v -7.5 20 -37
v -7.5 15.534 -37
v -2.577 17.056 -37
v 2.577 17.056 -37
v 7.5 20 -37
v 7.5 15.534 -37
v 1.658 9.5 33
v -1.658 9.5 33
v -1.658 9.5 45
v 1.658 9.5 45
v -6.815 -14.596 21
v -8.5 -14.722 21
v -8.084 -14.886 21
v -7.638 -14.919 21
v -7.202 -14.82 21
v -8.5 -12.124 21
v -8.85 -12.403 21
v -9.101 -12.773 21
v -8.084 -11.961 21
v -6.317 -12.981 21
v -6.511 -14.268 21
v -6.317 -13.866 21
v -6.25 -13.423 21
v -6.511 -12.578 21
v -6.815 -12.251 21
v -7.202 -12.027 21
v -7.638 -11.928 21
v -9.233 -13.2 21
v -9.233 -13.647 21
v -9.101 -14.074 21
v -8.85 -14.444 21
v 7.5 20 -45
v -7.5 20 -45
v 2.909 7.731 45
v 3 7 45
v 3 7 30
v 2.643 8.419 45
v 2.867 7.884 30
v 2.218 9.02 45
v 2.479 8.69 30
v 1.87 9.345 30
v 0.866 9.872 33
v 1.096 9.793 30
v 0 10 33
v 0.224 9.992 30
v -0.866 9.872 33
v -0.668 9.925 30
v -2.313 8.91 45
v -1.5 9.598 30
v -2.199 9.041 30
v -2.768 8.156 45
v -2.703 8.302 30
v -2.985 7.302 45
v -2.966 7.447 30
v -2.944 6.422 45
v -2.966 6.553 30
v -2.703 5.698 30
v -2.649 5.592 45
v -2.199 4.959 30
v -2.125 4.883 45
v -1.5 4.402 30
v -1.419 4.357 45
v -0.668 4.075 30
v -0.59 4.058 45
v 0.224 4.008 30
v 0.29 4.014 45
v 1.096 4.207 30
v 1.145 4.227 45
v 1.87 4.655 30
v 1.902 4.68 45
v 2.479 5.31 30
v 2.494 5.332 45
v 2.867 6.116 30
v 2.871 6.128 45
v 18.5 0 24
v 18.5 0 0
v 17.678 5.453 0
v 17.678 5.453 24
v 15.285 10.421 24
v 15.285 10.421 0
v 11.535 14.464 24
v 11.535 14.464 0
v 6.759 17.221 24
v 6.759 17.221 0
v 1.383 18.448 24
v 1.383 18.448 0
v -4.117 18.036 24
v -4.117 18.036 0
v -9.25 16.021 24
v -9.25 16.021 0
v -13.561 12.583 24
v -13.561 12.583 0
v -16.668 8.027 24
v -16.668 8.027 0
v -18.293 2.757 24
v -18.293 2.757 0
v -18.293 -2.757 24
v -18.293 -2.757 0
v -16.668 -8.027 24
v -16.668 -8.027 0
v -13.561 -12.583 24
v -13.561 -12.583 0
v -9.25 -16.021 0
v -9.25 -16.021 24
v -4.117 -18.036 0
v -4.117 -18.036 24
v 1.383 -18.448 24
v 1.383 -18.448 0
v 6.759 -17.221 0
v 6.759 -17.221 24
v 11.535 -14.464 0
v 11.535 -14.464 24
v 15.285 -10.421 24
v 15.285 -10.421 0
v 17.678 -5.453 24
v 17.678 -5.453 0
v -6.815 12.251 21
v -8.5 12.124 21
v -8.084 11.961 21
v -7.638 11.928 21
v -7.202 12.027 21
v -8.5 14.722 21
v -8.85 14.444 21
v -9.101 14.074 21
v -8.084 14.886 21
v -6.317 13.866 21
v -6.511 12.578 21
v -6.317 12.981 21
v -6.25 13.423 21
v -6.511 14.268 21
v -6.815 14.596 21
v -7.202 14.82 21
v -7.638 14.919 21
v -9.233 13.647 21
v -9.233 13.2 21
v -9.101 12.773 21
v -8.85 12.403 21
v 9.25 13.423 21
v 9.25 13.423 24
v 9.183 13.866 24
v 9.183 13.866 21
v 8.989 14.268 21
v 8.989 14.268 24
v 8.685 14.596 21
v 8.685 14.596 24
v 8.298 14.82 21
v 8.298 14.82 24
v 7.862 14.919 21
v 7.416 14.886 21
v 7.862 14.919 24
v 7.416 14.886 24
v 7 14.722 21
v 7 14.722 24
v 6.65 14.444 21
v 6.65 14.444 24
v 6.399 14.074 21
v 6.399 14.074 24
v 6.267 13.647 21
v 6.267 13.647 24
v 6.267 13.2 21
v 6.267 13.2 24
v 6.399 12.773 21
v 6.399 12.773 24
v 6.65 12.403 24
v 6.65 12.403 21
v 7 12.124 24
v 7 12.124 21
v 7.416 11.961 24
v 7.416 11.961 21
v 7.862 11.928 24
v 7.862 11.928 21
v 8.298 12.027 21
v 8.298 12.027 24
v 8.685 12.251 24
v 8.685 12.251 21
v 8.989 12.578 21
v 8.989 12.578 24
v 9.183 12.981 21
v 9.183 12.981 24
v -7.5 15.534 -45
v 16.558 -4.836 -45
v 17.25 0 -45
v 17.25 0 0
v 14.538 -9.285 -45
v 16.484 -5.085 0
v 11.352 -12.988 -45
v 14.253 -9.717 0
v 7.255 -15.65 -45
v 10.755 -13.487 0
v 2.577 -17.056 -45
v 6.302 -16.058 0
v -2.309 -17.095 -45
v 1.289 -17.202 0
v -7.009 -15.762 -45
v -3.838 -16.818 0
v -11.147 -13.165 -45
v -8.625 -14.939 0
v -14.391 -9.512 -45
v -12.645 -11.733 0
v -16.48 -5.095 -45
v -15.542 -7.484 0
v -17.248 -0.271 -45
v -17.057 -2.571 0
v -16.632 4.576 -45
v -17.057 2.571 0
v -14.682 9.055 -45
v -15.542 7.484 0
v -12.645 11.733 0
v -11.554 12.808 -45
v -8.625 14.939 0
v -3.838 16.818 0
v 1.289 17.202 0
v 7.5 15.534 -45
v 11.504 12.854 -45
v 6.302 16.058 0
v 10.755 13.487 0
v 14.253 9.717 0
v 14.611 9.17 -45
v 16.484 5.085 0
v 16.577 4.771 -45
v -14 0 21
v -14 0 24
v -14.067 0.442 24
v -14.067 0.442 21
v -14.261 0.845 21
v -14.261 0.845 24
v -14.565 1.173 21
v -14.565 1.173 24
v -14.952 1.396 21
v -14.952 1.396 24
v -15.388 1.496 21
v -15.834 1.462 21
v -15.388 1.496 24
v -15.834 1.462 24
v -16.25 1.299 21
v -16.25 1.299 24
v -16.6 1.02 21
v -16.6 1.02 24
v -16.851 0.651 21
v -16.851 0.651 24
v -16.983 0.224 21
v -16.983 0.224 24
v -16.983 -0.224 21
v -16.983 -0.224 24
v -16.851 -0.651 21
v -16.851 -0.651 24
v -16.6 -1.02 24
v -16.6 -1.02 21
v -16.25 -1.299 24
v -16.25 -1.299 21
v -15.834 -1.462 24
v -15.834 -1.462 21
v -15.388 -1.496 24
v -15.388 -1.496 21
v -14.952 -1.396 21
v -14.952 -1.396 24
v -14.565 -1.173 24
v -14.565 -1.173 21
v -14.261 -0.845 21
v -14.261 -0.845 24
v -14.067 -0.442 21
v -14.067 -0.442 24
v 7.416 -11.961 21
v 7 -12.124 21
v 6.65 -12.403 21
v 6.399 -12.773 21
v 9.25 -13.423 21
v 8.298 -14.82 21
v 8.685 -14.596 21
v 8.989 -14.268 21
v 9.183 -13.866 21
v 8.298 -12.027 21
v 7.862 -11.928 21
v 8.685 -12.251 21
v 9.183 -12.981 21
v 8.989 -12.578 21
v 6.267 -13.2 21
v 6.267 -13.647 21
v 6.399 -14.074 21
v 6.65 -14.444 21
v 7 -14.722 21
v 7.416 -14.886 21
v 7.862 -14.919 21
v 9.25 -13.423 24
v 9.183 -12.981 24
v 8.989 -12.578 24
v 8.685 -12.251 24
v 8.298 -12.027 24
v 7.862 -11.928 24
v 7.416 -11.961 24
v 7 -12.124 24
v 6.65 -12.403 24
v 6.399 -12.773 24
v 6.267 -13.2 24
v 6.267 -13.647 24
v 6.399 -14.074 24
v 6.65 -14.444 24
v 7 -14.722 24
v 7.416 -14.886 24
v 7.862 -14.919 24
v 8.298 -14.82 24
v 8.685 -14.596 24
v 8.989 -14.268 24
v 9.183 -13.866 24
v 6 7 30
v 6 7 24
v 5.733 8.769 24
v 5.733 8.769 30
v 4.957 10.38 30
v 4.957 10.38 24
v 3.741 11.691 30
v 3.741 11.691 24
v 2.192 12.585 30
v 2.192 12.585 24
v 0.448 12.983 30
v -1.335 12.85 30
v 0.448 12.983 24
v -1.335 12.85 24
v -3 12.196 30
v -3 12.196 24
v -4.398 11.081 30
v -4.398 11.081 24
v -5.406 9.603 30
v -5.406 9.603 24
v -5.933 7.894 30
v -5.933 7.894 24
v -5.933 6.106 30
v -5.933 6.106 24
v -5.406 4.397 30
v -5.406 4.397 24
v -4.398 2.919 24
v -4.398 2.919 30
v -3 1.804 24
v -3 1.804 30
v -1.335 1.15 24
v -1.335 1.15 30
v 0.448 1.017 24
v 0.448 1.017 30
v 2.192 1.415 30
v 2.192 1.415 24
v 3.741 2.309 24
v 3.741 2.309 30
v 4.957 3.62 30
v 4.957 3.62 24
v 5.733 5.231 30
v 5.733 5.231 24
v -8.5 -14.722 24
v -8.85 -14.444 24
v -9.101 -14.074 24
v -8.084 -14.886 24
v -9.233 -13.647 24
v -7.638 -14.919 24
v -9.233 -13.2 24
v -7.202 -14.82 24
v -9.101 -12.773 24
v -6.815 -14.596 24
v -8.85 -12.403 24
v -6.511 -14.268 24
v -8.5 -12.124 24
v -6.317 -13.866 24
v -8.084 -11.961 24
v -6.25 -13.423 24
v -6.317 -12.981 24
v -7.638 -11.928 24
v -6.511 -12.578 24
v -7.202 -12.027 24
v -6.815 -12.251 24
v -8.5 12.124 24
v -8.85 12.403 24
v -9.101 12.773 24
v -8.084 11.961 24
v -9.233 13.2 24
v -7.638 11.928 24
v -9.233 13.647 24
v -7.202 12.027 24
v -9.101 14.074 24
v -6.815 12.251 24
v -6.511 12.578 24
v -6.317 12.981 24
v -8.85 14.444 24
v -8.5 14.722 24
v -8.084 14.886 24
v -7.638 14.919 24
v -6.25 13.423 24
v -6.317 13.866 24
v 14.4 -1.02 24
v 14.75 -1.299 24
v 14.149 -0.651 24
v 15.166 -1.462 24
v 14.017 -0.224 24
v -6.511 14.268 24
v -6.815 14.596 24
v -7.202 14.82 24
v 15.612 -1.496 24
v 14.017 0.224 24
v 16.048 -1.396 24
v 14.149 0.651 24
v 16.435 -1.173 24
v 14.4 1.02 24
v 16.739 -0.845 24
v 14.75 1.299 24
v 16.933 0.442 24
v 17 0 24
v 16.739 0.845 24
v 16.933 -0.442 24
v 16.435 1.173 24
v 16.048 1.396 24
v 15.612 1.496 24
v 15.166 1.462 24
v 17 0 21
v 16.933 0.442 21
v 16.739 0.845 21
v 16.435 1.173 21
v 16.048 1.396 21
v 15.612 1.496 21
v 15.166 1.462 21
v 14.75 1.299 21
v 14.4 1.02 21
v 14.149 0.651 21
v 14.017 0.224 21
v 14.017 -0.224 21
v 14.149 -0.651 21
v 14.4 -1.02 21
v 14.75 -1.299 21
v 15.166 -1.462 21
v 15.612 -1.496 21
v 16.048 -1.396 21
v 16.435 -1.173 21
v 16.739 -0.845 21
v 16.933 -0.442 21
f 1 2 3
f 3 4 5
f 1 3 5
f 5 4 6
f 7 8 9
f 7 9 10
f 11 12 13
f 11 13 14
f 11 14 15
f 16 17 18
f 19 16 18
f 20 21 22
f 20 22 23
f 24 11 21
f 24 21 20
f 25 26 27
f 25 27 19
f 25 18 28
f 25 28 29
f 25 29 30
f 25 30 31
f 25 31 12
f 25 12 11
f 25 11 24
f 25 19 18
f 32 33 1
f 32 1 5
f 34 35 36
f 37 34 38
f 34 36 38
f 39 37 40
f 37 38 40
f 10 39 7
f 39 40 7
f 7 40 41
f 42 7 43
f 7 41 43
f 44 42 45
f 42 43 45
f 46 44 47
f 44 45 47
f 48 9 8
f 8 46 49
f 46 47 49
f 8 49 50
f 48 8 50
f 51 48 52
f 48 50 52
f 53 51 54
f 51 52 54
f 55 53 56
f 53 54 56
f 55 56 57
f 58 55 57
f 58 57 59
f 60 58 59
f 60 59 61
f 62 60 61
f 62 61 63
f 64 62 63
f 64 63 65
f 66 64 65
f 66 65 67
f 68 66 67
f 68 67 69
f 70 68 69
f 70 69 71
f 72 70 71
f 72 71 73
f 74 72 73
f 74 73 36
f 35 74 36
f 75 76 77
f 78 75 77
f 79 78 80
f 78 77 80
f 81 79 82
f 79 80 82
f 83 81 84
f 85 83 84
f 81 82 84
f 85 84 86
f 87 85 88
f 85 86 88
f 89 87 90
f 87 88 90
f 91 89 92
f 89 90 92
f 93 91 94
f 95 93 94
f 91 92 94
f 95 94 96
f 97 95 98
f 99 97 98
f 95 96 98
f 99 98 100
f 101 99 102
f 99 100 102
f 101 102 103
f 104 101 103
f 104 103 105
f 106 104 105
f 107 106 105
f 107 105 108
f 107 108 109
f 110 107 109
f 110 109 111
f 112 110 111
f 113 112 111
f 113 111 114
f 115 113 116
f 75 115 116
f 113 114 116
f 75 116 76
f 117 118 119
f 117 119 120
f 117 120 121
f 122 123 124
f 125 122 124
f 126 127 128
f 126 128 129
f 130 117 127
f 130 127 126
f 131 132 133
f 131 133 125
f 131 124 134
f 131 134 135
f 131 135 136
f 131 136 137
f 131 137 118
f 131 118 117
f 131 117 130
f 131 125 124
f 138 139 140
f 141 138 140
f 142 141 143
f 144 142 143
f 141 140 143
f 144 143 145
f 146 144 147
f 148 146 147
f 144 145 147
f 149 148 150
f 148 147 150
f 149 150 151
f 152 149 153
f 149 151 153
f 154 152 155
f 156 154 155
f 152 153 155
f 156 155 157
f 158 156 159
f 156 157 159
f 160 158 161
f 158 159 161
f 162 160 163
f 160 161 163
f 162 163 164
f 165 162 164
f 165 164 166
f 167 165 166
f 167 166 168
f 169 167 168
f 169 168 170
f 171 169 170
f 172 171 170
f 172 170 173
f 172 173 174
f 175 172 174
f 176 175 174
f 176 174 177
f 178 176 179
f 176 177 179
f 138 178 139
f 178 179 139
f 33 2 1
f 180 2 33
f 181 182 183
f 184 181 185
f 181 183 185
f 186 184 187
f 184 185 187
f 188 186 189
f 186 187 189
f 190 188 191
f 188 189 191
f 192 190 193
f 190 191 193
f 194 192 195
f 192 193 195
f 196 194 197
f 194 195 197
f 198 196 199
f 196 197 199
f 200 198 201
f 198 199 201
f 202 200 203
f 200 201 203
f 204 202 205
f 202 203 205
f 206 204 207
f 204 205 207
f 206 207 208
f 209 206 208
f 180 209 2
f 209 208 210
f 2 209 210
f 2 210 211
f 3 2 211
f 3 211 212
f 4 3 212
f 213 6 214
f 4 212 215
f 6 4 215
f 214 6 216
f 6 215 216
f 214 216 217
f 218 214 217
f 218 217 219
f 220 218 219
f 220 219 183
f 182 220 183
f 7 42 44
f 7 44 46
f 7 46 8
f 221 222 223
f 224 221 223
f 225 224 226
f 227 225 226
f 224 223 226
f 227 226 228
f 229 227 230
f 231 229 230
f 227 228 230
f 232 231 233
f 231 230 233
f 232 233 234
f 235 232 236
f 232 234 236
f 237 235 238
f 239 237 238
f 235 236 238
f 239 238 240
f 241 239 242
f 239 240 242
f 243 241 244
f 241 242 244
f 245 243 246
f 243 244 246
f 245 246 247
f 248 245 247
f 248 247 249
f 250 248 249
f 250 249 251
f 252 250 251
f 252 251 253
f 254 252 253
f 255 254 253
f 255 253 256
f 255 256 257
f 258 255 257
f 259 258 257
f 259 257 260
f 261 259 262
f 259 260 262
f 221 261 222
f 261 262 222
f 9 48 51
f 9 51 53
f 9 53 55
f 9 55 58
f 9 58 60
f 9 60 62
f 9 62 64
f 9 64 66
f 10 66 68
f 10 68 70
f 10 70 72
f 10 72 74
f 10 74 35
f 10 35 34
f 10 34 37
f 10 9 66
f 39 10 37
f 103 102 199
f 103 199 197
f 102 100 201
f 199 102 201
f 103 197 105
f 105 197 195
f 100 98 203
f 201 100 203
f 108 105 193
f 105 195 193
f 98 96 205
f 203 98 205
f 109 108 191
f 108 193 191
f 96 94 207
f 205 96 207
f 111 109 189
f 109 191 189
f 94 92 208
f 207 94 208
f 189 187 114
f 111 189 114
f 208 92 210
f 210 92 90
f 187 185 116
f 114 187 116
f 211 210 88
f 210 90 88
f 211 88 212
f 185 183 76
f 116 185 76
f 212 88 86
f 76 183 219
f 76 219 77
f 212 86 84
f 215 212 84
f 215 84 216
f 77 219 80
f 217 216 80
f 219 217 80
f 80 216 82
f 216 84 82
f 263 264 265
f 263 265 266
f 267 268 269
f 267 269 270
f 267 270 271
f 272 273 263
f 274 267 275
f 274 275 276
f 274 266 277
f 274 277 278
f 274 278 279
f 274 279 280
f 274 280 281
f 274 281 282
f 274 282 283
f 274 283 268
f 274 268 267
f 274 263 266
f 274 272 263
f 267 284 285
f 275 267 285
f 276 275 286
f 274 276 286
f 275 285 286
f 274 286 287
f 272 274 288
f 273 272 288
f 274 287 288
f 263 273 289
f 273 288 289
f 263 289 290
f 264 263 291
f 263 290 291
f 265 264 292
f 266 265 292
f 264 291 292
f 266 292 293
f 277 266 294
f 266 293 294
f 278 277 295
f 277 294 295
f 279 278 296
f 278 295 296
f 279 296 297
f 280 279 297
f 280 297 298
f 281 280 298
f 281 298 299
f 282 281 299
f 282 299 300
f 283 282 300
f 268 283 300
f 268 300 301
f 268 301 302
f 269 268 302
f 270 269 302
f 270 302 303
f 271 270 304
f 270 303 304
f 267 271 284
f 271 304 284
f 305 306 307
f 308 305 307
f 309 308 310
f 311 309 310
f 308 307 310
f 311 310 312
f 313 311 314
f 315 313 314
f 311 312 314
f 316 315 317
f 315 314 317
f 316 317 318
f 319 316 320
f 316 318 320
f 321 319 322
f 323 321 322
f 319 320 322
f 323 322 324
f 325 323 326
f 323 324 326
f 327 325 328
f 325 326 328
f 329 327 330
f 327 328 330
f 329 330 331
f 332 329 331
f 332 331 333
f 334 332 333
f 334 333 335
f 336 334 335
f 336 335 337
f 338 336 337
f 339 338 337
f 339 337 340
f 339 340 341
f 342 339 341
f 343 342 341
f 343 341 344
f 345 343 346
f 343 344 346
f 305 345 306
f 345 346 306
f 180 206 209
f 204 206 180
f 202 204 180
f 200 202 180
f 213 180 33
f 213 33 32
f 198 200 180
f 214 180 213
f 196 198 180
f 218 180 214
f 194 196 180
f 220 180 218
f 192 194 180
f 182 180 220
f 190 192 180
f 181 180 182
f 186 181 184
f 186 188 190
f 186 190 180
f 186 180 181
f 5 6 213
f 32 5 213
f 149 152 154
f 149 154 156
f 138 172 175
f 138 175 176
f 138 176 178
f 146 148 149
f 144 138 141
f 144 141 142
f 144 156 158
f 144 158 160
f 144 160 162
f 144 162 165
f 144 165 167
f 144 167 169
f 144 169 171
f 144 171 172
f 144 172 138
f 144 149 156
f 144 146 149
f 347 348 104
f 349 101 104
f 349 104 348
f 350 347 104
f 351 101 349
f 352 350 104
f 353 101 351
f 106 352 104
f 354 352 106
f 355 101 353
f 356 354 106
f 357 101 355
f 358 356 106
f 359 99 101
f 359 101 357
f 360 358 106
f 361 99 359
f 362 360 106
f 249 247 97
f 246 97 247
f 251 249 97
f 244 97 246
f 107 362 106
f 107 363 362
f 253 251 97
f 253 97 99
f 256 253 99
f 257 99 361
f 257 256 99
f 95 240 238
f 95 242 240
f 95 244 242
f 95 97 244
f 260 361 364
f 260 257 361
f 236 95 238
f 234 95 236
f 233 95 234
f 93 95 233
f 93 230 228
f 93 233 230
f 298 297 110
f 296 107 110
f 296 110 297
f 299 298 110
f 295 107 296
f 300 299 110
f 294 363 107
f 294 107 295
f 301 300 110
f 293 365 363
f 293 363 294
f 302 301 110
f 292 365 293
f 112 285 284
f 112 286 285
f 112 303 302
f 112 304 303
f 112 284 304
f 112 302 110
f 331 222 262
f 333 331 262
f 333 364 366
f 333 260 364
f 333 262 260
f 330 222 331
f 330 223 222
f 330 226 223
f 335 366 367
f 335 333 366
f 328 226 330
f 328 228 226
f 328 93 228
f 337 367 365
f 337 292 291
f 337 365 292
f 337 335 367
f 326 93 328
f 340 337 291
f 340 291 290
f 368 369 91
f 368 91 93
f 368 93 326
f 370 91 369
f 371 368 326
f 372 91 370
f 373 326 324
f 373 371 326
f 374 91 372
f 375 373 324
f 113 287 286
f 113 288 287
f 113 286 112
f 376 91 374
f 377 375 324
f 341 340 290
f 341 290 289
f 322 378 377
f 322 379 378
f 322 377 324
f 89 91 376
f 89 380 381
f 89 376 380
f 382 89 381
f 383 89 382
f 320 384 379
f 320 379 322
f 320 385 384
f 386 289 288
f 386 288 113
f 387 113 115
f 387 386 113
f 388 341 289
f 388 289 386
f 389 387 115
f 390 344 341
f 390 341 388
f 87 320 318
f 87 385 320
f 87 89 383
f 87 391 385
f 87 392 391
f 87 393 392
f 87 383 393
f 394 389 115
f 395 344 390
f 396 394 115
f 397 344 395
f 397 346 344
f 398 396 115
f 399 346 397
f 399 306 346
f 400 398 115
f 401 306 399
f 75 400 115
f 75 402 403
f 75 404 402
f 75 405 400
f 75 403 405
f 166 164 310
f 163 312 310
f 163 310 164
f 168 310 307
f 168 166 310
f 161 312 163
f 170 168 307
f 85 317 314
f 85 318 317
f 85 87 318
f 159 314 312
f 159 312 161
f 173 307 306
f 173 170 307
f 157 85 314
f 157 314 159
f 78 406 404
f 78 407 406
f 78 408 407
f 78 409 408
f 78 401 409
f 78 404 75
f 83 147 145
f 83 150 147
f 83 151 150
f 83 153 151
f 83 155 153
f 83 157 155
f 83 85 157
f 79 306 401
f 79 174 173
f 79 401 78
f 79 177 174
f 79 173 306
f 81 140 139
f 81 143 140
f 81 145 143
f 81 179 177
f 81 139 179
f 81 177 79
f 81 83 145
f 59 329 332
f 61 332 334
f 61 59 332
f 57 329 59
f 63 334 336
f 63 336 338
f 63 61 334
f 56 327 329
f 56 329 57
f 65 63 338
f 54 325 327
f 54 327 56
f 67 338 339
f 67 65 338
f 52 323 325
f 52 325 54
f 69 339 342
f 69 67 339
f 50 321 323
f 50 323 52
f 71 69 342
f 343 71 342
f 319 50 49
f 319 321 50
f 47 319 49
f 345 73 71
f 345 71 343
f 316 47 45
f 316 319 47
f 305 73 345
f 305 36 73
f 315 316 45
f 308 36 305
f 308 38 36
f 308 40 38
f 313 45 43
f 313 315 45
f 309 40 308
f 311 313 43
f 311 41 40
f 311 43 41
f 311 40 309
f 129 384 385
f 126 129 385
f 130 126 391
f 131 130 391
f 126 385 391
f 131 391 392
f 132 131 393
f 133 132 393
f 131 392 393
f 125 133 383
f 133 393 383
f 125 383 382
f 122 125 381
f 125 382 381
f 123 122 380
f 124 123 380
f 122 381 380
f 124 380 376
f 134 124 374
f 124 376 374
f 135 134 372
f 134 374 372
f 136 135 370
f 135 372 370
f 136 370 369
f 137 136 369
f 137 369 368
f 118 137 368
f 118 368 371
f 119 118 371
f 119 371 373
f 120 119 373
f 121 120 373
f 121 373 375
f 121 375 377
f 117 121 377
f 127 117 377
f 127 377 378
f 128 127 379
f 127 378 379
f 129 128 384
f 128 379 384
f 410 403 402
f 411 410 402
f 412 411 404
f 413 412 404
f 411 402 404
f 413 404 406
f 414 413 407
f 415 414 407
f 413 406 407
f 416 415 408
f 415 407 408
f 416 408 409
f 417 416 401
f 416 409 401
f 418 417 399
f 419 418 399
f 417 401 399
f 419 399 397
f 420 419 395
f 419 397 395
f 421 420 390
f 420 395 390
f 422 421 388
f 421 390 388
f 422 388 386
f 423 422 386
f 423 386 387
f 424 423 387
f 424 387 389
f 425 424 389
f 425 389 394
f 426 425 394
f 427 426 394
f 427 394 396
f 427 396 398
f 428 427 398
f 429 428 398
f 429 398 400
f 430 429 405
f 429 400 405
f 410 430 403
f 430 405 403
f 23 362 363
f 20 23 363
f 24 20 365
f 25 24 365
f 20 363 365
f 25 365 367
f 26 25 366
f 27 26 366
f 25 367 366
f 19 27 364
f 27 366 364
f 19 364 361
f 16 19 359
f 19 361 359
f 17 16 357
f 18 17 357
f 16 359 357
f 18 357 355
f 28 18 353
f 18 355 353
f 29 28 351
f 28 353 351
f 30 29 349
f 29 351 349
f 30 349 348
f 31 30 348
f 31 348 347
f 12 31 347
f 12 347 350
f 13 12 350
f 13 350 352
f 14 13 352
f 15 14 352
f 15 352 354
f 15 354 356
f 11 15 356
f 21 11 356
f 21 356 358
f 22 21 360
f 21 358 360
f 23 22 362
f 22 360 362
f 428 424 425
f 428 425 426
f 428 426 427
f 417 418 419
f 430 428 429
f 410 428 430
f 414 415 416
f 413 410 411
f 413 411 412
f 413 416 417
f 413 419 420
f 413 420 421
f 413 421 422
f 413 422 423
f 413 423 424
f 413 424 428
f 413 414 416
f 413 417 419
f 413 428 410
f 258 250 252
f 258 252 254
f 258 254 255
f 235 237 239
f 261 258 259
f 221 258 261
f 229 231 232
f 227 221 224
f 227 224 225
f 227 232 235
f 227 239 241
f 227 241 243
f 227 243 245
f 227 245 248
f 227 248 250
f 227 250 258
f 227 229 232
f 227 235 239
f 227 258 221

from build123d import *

# Parameters (mm, degrees)
SKETCH1_R           = 18.5
BOSS_EXTRUDE1_DEPTH = 24
SKETCH2_R           = 17.25
BOSS_EXTRUDE2_DEPTH = 45
SKETCH3_R           = 6
BOSS_EXTRUDE3_DEPTH = 6
SKETCH4_R           = 3
BOSS_EXTRUDE4_DEPTH = 15
CUT_EXTRUDE1_START  = -12
CUT_EXTRUDE1_DEPTH  = 12
SKETCH6_R           = 1.5
CUT_EXTRUDE2_DEPTH  = 3
SKETCH7_W           = 15
SKETCH7_H           = 8
BOSS_EXTRUDE5_DEPTH = 20


with BuildPart() as part:
    # Sketch1 → Boss-Extrude1 (new body)
    with BuildSketch(Plane.XY):
        Circle(SKETCH1_R)
    extrude(amount=BOSS_EXTRUDE1_DEPTH)

    # Sketch2 → Boss-Extrude2 (add)
    with BuildSketch(Plane(origin=(0, 0, 0), x_dir=(-1, 0, 0), z_dir=(0, 0, -1))):
        with Locations(Location((0, 0, 0), (0, 0, 180))):
            Circle(SKETCH2_R)
    extrude(amount=BOSS_EXTRUDE2_DEPTH)

    # Sketch3 → Boss-Extrude3 (add)
    with BuildSketch(Plane.XY.offset(24)):
        with Locations((0, 7)):
            Circle(SKETCH3_R)
    extrude(amount=BOSS_EXTRUDE3_DEPTH)

    # Sketch4 → Boss-Extrude4 (add)
    with BuildSketch(Plane.XY.offset(30)):
        with Locations((0, 7)):
            Circle(SKETCH4_R)
    extrude(amount=BOSS_EXTRUDE4_DEPTH)

    # Sketch5 → Cut-Extrude1 (cut)
    with BuildSketch(Plane.XY.offset(45).offset(CUT_EXTRUDE1_START)):
        with BuildLine():
            ThreePointArc((1.658312395, 9.5), (0, 10), (-1.658312395, 9.5))
            Line((-1.658312395, 9.5), (0, 9.5))
            Line((0, 9.5), (1.658312395, 9.5))
        make_face()
    extrude(amount=CUT_EXTRUDE1_DEPTH, mode=Mode.SUBTRACT)

    # Sketch6 → Cut-Extrude2 (cut)
    with BuildSketch(Plane.XY.offset(24)):
        with Locations((7.75, 13.423393759)):
            Circle(SKETCH6_R)
        with Locations((15.5, 0)):
            Circle(SKETCH6_R)
        with Locations((7.75, -13.423393759)):
            Circle(SKETCH6_R)
        with Locations((-7.75, -13.423393759)):
            Circle(SKETCH6_R)
        with Locations((-15.5, 0)):
            Circle(SKETCH6_R)
        with Locations((-7.75, 13.423393759)):
            Circle(SKETCH6_R)
    extrude(amount=-CUT_EXTRUDE2_DEPTH, mode=Mode.SUBTRACT)

    # Sketch7 → Boss-Extrude5 (add)
    with BuildSketch(Plane(origin=(0, 0, 0), x_dir=(1, 0, 0), z_dir=(0, 1, 0))):
        with Locations((0, 41)):
            Rectangle(SKETCH7_W, SKETCH7_H)
    extrude(amount=BOSS_EXTRUDE5_DEPTH)


solid = part.part
